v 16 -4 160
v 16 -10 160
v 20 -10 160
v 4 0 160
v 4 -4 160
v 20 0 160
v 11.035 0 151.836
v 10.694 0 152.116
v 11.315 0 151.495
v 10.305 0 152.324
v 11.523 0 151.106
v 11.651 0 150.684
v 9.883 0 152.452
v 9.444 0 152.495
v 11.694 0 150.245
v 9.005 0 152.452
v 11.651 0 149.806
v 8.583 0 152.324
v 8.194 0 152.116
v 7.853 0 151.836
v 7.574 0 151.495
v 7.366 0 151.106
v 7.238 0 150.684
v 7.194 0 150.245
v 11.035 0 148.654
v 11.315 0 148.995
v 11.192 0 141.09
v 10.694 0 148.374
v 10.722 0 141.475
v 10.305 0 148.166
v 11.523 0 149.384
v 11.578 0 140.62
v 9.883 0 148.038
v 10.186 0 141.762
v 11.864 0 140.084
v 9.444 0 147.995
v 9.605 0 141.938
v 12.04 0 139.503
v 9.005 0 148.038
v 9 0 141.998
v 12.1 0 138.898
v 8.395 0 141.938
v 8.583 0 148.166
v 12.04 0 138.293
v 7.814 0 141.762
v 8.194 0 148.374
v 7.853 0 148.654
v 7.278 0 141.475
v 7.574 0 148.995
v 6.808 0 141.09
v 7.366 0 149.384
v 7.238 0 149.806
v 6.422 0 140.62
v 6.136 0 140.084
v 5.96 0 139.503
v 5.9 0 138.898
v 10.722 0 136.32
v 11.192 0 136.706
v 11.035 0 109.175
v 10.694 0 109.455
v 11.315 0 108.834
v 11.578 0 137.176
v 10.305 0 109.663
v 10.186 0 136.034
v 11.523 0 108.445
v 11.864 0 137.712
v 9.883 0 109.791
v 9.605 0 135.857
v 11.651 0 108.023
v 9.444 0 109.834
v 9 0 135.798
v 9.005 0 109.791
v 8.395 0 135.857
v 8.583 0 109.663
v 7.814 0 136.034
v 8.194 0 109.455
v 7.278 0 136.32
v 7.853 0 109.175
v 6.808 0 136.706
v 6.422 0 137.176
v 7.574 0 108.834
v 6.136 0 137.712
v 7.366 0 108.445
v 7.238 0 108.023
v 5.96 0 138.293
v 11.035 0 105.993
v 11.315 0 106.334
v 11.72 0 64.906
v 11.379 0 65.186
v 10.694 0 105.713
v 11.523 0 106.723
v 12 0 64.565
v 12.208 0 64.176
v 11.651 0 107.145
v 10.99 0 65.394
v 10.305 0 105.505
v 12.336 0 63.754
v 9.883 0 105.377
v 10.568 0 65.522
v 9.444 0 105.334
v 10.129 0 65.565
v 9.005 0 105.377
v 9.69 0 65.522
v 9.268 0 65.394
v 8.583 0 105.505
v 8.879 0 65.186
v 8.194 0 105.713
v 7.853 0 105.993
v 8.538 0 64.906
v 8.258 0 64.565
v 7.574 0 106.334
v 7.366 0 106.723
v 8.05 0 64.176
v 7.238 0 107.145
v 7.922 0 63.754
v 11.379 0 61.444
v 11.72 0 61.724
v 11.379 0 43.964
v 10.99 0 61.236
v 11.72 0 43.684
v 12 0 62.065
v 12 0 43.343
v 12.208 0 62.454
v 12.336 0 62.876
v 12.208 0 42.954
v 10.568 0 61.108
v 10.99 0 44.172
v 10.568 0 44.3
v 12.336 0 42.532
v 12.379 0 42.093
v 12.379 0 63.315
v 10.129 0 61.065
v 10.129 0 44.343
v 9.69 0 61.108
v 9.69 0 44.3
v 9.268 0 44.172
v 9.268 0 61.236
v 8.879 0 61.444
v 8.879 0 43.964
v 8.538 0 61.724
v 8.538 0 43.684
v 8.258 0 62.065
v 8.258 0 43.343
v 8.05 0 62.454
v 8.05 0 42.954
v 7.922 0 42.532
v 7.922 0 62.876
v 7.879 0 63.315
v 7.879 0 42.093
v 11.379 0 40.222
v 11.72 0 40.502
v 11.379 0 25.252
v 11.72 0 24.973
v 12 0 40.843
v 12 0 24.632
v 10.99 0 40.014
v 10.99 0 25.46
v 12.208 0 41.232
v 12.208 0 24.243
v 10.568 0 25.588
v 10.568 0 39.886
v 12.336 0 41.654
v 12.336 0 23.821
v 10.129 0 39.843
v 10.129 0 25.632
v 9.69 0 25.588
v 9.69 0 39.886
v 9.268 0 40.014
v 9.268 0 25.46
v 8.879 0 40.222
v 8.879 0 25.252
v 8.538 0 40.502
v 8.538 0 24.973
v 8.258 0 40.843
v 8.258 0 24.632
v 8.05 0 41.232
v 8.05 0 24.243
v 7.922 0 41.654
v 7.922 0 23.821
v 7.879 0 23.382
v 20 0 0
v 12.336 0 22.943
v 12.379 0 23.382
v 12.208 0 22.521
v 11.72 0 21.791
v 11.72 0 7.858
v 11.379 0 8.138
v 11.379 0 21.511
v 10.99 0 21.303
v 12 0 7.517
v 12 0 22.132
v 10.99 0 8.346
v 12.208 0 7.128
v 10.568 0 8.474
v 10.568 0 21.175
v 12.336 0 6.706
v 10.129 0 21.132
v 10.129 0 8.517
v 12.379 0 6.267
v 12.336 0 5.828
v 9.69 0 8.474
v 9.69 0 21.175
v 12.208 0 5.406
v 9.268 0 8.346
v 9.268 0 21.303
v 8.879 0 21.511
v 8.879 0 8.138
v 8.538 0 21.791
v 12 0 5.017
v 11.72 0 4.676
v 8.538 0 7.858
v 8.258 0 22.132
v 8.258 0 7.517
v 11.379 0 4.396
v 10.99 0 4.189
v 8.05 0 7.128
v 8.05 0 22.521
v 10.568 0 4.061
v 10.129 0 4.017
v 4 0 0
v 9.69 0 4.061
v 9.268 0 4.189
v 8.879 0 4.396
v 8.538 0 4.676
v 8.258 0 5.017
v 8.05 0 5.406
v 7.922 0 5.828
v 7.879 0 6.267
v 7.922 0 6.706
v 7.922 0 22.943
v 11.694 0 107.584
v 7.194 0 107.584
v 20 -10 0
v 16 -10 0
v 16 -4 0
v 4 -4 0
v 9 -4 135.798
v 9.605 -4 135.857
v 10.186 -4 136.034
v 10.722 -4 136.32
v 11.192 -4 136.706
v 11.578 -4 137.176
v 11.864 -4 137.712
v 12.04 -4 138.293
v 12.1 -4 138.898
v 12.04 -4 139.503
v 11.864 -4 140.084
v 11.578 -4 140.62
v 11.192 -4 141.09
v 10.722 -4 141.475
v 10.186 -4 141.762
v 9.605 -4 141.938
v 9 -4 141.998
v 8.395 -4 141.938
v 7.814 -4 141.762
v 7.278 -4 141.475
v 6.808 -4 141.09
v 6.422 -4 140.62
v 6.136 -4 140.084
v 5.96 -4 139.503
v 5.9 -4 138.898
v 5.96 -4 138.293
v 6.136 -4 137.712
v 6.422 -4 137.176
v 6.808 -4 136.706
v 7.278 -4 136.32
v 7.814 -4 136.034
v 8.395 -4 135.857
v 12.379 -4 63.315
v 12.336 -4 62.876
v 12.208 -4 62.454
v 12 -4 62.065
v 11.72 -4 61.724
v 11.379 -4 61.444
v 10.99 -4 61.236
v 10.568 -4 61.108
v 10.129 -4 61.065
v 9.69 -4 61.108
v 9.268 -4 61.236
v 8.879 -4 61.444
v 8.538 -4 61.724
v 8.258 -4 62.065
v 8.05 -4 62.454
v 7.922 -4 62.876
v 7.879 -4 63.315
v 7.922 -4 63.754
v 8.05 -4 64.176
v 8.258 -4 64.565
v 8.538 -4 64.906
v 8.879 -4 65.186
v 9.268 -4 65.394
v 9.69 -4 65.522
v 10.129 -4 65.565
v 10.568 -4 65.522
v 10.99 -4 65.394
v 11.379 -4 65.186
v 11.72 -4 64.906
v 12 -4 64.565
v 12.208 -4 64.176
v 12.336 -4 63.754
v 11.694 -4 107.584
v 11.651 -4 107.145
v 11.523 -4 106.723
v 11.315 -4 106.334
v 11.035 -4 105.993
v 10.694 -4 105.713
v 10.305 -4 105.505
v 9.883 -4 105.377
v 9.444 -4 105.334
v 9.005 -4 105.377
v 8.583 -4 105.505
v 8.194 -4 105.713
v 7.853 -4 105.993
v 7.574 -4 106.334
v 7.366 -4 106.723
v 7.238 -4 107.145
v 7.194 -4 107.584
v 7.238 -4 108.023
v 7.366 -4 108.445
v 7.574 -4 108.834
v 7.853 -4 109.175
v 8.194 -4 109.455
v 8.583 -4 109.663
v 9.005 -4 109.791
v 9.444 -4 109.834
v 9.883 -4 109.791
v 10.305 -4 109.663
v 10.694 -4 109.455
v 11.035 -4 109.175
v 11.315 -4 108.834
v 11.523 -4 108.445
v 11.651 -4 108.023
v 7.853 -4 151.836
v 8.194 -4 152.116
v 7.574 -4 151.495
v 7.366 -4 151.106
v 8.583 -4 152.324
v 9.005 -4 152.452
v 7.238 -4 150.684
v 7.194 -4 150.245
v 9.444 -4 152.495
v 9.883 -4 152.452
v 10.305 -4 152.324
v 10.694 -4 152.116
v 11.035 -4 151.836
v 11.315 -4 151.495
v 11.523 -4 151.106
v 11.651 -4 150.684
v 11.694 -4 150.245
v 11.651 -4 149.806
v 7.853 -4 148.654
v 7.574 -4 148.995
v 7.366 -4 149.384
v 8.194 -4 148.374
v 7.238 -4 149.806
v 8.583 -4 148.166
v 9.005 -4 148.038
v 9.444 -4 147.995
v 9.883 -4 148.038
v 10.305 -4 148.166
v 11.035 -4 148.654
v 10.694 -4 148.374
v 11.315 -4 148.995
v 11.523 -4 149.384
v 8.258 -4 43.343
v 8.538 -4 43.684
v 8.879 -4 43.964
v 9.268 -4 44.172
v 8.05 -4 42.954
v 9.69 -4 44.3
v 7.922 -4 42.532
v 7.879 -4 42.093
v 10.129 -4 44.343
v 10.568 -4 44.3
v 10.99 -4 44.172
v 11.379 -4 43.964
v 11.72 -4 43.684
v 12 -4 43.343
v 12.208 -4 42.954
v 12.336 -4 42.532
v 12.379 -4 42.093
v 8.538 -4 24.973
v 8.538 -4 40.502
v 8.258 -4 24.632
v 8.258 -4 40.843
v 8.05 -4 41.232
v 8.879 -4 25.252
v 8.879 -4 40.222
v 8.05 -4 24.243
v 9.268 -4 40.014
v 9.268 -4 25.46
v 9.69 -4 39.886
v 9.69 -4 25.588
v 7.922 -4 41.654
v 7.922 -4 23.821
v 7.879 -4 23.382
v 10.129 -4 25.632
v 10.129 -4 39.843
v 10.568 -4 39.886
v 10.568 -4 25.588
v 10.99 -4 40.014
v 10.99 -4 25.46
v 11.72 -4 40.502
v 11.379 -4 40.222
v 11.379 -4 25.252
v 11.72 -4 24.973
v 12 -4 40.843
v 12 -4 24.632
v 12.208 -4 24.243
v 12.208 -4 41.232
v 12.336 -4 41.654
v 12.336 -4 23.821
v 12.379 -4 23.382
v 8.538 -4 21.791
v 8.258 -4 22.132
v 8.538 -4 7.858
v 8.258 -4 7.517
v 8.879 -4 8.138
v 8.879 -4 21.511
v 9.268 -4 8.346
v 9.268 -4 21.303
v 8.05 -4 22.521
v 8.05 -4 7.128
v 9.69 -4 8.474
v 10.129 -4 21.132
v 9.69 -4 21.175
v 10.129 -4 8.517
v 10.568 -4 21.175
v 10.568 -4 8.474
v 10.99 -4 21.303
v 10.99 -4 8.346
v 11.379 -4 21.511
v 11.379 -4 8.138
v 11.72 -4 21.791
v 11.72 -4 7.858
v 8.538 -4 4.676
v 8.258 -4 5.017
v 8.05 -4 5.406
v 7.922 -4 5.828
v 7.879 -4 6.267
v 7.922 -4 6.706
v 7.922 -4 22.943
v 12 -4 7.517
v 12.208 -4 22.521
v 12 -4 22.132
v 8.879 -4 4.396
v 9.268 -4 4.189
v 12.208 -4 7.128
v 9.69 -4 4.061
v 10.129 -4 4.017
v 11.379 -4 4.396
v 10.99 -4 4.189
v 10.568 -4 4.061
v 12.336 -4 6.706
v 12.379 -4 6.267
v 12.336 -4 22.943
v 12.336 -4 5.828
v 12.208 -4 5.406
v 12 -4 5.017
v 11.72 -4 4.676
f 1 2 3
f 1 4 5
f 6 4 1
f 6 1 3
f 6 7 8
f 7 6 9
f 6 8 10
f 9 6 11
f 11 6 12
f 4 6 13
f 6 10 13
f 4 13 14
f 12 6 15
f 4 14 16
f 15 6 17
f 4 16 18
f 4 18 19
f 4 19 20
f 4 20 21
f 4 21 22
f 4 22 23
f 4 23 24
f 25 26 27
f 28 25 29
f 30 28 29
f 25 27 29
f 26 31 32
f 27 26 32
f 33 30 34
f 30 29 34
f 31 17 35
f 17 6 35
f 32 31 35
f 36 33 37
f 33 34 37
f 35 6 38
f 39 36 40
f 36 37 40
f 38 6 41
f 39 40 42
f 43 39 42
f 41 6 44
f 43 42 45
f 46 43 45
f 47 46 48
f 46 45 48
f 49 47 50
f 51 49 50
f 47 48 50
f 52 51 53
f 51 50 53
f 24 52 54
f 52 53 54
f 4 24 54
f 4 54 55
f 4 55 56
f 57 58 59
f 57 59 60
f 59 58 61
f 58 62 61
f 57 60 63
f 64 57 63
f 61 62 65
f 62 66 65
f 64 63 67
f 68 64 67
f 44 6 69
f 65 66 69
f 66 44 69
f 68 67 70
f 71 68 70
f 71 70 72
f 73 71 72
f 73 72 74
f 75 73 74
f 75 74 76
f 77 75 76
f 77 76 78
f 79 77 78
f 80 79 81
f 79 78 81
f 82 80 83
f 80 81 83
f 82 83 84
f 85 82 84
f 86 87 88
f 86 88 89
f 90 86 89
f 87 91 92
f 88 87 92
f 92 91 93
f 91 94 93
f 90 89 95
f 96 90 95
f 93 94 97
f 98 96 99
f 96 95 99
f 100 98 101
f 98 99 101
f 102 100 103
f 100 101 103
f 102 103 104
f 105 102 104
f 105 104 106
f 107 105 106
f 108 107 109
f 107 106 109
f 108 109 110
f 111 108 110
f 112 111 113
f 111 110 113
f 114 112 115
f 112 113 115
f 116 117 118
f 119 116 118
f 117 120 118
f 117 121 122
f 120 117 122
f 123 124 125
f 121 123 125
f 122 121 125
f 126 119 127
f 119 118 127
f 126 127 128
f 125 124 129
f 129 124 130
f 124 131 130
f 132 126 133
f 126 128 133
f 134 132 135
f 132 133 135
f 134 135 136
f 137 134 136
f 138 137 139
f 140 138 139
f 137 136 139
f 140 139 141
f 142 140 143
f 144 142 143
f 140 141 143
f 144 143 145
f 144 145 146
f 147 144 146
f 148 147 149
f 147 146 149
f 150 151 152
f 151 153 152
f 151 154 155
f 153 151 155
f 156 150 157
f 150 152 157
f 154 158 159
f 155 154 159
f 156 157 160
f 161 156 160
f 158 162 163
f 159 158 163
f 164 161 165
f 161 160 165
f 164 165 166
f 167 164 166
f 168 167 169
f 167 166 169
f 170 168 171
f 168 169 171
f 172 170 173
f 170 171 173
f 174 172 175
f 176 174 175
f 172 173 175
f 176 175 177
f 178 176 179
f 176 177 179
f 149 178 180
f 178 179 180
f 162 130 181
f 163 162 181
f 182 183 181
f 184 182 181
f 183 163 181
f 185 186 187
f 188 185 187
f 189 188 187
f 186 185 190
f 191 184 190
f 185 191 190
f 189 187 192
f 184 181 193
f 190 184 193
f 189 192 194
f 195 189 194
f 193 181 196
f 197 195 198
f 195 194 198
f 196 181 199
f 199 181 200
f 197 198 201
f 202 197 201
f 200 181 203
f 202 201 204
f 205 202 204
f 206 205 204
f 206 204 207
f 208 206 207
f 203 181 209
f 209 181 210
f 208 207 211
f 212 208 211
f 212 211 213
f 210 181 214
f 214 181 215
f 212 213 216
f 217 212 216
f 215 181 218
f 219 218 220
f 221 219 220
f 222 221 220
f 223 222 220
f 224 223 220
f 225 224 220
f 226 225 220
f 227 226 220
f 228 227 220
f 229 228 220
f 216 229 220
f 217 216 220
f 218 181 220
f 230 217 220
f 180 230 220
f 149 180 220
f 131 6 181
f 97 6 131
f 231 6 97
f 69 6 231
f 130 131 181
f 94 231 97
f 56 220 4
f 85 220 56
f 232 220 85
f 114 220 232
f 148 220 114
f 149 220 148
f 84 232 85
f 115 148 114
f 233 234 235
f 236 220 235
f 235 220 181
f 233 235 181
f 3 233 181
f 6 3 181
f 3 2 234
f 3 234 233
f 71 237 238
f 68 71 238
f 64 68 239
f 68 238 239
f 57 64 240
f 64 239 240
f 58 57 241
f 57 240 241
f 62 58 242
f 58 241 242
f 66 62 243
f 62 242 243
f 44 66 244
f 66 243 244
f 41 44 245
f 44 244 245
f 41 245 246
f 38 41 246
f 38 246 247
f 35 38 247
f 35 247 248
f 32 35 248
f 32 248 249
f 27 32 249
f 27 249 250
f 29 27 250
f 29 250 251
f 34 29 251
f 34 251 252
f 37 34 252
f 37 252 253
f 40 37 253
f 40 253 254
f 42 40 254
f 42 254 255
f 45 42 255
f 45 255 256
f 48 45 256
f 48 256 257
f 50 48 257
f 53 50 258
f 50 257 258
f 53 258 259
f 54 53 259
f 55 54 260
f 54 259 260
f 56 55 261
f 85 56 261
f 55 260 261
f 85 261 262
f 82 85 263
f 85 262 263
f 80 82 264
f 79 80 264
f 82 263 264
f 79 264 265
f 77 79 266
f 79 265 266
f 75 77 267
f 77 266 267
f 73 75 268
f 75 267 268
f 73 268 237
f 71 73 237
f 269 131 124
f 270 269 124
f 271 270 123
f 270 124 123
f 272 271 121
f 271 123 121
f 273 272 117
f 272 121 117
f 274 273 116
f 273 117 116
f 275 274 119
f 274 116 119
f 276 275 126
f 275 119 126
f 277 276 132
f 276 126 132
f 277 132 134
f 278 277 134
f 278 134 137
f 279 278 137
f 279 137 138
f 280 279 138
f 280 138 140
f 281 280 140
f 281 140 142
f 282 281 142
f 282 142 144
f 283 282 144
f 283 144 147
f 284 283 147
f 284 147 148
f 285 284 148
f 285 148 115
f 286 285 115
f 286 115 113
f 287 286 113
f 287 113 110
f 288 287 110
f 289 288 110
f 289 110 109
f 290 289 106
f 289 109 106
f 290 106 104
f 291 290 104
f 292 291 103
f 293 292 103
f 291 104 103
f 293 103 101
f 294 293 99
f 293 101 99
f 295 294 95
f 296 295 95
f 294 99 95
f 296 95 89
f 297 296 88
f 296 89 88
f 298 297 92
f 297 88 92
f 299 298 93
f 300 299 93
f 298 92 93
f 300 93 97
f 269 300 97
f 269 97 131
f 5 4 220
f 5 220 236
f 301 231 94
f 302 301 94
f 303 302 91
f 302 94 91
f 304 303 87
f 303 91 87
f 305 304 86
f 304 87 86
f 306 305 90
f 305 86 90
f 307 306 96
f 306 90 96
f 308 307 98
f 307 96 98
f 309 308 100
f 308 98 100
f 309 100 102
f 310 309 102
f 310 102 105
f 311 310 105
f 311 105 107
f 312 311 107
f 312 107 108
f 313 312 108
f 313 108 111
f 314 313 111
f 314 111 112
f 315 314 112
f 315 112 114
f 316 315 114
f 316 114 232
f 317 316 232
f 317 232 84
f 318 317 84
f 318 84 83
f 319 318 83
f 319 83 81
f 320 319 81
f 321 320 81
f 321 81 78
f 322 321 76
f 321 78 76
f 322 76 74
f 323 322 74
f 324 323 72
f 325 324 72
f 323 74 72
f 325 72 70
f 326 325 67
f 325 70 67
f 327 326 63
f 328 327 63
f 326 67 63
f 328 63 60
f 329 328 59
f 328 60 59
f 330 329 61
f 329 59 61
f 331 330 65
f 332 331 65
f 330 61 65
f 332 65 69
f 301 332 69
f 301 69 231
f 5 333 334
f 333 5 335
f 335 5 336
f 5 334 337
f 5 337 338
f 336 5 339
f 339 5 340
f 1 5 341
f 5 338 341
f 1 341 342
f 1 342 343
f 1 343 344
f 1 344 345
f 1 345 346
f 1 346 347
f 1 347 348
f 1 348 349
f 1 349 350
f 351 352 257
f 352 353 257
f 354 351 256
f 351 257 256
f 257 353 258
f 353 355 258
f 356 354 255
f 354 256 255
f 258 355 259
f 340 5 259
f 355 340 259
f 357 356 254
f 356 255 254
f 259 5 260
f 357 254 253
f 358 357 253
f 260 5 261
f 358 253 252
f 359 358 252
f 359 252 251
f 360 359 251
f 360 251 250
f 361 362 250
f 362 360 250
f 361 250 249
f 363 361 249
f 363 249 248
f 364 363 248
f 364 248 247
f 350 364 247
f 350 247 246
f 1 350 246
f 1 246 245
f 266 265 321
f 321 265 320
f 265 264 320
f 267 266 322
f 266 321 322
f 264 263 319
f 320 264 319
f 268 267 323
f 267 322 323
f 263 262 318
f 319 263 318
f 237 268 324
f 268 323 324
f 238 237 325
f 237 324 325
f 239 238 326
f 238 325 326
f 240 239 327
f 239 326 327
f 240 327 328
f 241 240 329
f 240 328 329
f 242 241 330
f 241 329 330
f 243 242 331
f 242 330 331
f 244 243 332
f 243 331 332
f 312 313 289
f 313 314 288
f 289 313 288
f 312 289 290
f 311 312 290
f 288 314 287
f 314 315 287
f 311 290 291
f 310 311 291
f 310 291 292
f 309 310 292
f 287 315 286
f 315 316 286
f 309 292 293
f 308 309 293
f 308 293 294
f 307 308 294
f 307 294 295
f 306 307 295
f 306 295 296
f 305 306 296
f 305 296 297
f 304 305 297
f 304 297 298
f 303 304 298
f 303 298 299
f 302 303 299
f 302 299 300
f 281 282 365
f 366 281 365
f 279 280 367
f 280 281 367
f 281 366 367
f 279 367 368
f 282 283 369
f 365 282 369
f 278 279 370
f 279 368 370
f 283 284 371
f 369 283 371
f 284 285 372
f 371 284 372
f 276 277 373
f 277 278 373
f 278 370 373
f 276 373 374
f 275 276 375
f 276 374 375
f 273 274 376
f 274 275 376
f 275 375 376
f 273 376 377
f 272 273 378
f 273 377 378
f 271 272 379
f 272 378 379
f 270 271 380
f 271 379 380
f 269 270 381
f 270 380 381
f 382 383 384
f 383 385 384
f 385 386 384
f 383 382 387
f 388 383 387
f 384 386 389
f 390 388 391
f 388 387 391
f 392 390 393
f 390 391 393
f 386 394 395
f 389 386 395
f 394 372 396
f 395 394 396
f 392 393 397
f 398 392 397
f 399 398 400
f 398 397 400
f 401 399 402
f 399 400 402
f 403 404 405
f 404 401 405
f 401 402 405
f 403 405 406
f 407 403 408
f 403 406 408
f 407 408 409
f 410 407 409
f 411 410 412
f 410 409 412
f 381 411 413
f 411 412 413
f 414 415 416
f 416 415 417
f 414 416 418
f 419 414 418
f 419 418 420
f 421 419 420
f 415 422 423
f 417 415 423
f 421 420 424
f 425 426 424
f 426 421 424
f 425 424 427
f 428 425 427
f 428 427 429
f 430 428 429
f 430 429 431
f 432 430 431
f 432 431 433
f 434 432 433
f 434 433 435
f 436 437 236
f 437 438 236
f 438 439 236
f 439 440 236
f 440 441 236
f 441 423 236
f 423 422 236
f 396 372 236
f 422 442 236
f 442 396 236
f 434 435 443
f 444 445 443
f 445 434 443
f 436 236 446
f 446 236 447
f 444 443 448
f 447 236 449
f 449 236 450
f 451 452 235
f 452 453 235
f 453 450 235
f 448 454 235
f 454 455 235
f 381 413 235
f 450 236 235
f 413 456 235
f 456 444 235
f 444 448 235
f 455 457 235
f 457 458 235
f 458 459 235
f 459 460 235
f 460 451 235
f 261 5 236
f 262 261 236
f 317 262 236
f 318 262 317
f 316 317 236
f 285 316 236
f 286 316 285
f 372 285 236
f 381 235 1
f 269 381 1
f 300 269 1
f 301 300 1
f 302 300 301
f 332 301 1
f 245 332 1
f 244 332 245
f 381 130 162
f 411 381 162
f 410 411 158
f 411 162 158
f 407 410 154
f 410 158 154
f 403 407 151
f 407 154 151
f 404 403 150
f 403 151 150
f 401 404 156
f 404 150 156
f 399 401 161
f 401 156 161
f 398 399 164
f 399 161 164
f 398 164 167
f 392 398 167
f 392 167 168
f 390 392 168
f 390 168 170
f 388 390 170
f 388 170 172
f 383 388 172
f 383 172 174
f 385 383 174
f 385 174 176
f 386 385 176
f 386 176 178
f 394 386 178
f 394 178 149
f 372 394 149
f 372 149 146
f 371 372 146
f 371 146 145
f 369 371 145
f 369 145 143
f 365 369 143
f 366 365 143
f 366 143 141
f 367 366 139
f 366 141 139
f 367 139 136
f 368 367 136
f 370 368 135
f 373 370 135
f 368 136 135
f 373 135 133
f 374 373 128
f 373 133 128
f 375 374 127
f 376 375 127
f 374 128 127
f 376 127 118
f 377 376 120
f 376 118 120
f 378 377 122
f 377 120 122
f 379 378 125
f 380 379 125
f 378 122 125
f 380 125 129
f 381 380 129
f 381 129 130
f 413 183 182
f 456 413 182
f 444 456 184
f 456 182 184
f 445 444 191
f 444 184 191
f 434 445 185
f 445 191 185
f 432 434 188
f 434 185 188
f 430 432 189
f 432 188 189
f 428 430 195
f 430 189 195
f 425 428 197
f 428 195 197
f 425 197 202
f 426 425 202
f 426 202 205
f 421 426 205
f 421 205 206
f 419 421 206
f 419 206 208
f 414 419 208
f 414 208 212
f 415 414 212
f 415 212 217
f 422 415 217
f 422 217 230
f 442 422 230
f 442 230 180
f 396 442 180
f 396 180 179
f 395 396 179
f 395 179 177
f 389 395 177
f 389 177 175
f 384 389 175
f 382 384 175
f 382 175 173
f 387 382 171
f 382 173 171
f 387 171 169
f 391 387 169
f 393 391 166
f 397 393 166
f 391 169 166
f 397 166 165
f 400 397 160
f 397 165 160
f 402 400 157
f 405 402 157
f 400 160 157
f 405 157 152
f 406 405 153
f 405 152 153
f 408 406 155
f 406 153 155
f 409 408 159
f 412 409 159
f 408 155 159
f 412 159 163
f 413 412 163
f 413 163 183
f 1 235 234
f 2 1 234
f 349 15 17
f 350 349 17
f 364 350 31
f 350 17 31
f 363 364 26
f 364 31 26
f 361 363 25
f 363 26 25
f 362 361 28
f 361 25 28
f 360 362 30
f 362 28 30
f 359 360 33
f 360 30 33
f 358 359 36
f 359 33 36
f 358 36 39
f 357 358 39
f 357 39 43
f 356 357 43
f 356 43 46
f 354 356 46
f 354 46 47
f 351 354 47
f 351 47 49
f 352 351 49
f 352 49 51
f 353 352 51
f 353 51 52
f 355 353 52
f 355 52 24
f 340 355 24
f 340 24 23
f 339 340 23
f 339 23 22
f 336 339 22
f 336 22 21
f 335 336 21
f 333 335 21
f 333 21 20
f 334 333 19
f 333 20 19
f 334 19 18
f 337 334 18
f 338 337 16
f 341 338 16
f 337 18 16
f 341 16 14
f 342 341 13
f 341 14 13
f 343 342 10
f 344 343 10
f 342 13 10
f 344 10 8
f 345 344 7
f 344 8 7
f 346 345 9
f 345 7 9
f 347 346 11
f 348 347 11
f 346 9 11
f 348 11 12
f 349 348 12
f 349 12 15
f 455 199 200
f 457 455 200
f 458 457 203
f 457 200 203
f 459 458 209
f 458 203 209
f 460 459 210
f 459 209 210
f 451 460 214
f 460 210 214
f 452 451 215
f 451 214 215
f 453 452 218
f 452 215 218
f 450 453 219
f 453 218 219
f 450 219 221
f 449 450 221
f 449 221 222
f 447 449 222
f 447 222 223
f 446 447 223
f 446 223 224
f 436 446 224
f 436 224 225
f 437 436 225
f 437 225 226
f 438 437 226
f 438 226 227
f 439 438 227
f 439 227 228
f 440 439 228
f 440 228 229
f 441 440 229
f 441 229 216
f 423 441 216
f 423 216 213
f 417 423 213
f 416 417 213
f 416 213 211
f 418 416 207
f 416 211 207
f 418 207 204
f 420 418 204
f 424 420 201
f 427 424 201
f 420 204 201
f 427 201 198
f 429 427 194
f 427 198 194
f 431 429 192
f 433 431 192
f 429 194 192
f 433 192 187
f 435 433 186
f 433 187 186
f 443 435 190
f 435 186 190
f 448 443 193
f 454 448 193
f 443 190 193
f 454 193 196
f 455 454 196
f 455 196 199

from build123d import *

# Parameters (mm, degrees)
BOSS_EXTRUDE1_DEPTH  = 160
M4_CLEARANCE_HOLE1_D = 4.5
CUT_EXTRUDE2_REACH   = 163.357
SKETCH5_R            = 3.1


with BuildPart() as part:
    # Sketch1 → Boss-Extrude1 (new body)
    with BuildSketch(Plane.XY):
        Polygon((4, -4), (16, -4), (16, -10), (20, -10), (20, 0), (16, 0), (4, 0), align=None)
    extrude(amount=BOSS_EXTRUDE1_DEPTH)

    # M4 Clearance Hole1 (through all)
    with Locations(Plane(origin=(0, -4, 0), x_dir=(-1, 0, 0), z_dir=(0, -1, 0))):
        with Locations((-10.128911503, -6.267286375), (-10.128911503, -23.38156703), (-10.128911503, -42.093180546), (-10.128911503, -63.314888558), (-9.444340277, -107.583827852), (-9.444340277, -150.244789298)):
            Hole(M4_CLEARANCE_HOLE1_D / 2)

    # Sketch5 → Cut-Extrude2 (cut, up to next)
    with BuildSketch(Plane.XZ.offset(4), mode=Mode.PRIVATE) as cut_extrude2_sk1:
        with Locations(Location((9, 138.897931951, 0), (0, 0, 270))):
            Circle(SKETCH5_R)
    cut_extrude2_tool1 = extrude(cut_extrude2_sk1.sketch, amount=-CUT_EXTRUDE2_REACH, mode=Mode.PRIVATE) & part.part
    add(cut_extrude2_tool1.solids().sort_by_distance((9, -4, 138.897932))[0], mode=Mode.SUBTRACT)


solid = part.part
